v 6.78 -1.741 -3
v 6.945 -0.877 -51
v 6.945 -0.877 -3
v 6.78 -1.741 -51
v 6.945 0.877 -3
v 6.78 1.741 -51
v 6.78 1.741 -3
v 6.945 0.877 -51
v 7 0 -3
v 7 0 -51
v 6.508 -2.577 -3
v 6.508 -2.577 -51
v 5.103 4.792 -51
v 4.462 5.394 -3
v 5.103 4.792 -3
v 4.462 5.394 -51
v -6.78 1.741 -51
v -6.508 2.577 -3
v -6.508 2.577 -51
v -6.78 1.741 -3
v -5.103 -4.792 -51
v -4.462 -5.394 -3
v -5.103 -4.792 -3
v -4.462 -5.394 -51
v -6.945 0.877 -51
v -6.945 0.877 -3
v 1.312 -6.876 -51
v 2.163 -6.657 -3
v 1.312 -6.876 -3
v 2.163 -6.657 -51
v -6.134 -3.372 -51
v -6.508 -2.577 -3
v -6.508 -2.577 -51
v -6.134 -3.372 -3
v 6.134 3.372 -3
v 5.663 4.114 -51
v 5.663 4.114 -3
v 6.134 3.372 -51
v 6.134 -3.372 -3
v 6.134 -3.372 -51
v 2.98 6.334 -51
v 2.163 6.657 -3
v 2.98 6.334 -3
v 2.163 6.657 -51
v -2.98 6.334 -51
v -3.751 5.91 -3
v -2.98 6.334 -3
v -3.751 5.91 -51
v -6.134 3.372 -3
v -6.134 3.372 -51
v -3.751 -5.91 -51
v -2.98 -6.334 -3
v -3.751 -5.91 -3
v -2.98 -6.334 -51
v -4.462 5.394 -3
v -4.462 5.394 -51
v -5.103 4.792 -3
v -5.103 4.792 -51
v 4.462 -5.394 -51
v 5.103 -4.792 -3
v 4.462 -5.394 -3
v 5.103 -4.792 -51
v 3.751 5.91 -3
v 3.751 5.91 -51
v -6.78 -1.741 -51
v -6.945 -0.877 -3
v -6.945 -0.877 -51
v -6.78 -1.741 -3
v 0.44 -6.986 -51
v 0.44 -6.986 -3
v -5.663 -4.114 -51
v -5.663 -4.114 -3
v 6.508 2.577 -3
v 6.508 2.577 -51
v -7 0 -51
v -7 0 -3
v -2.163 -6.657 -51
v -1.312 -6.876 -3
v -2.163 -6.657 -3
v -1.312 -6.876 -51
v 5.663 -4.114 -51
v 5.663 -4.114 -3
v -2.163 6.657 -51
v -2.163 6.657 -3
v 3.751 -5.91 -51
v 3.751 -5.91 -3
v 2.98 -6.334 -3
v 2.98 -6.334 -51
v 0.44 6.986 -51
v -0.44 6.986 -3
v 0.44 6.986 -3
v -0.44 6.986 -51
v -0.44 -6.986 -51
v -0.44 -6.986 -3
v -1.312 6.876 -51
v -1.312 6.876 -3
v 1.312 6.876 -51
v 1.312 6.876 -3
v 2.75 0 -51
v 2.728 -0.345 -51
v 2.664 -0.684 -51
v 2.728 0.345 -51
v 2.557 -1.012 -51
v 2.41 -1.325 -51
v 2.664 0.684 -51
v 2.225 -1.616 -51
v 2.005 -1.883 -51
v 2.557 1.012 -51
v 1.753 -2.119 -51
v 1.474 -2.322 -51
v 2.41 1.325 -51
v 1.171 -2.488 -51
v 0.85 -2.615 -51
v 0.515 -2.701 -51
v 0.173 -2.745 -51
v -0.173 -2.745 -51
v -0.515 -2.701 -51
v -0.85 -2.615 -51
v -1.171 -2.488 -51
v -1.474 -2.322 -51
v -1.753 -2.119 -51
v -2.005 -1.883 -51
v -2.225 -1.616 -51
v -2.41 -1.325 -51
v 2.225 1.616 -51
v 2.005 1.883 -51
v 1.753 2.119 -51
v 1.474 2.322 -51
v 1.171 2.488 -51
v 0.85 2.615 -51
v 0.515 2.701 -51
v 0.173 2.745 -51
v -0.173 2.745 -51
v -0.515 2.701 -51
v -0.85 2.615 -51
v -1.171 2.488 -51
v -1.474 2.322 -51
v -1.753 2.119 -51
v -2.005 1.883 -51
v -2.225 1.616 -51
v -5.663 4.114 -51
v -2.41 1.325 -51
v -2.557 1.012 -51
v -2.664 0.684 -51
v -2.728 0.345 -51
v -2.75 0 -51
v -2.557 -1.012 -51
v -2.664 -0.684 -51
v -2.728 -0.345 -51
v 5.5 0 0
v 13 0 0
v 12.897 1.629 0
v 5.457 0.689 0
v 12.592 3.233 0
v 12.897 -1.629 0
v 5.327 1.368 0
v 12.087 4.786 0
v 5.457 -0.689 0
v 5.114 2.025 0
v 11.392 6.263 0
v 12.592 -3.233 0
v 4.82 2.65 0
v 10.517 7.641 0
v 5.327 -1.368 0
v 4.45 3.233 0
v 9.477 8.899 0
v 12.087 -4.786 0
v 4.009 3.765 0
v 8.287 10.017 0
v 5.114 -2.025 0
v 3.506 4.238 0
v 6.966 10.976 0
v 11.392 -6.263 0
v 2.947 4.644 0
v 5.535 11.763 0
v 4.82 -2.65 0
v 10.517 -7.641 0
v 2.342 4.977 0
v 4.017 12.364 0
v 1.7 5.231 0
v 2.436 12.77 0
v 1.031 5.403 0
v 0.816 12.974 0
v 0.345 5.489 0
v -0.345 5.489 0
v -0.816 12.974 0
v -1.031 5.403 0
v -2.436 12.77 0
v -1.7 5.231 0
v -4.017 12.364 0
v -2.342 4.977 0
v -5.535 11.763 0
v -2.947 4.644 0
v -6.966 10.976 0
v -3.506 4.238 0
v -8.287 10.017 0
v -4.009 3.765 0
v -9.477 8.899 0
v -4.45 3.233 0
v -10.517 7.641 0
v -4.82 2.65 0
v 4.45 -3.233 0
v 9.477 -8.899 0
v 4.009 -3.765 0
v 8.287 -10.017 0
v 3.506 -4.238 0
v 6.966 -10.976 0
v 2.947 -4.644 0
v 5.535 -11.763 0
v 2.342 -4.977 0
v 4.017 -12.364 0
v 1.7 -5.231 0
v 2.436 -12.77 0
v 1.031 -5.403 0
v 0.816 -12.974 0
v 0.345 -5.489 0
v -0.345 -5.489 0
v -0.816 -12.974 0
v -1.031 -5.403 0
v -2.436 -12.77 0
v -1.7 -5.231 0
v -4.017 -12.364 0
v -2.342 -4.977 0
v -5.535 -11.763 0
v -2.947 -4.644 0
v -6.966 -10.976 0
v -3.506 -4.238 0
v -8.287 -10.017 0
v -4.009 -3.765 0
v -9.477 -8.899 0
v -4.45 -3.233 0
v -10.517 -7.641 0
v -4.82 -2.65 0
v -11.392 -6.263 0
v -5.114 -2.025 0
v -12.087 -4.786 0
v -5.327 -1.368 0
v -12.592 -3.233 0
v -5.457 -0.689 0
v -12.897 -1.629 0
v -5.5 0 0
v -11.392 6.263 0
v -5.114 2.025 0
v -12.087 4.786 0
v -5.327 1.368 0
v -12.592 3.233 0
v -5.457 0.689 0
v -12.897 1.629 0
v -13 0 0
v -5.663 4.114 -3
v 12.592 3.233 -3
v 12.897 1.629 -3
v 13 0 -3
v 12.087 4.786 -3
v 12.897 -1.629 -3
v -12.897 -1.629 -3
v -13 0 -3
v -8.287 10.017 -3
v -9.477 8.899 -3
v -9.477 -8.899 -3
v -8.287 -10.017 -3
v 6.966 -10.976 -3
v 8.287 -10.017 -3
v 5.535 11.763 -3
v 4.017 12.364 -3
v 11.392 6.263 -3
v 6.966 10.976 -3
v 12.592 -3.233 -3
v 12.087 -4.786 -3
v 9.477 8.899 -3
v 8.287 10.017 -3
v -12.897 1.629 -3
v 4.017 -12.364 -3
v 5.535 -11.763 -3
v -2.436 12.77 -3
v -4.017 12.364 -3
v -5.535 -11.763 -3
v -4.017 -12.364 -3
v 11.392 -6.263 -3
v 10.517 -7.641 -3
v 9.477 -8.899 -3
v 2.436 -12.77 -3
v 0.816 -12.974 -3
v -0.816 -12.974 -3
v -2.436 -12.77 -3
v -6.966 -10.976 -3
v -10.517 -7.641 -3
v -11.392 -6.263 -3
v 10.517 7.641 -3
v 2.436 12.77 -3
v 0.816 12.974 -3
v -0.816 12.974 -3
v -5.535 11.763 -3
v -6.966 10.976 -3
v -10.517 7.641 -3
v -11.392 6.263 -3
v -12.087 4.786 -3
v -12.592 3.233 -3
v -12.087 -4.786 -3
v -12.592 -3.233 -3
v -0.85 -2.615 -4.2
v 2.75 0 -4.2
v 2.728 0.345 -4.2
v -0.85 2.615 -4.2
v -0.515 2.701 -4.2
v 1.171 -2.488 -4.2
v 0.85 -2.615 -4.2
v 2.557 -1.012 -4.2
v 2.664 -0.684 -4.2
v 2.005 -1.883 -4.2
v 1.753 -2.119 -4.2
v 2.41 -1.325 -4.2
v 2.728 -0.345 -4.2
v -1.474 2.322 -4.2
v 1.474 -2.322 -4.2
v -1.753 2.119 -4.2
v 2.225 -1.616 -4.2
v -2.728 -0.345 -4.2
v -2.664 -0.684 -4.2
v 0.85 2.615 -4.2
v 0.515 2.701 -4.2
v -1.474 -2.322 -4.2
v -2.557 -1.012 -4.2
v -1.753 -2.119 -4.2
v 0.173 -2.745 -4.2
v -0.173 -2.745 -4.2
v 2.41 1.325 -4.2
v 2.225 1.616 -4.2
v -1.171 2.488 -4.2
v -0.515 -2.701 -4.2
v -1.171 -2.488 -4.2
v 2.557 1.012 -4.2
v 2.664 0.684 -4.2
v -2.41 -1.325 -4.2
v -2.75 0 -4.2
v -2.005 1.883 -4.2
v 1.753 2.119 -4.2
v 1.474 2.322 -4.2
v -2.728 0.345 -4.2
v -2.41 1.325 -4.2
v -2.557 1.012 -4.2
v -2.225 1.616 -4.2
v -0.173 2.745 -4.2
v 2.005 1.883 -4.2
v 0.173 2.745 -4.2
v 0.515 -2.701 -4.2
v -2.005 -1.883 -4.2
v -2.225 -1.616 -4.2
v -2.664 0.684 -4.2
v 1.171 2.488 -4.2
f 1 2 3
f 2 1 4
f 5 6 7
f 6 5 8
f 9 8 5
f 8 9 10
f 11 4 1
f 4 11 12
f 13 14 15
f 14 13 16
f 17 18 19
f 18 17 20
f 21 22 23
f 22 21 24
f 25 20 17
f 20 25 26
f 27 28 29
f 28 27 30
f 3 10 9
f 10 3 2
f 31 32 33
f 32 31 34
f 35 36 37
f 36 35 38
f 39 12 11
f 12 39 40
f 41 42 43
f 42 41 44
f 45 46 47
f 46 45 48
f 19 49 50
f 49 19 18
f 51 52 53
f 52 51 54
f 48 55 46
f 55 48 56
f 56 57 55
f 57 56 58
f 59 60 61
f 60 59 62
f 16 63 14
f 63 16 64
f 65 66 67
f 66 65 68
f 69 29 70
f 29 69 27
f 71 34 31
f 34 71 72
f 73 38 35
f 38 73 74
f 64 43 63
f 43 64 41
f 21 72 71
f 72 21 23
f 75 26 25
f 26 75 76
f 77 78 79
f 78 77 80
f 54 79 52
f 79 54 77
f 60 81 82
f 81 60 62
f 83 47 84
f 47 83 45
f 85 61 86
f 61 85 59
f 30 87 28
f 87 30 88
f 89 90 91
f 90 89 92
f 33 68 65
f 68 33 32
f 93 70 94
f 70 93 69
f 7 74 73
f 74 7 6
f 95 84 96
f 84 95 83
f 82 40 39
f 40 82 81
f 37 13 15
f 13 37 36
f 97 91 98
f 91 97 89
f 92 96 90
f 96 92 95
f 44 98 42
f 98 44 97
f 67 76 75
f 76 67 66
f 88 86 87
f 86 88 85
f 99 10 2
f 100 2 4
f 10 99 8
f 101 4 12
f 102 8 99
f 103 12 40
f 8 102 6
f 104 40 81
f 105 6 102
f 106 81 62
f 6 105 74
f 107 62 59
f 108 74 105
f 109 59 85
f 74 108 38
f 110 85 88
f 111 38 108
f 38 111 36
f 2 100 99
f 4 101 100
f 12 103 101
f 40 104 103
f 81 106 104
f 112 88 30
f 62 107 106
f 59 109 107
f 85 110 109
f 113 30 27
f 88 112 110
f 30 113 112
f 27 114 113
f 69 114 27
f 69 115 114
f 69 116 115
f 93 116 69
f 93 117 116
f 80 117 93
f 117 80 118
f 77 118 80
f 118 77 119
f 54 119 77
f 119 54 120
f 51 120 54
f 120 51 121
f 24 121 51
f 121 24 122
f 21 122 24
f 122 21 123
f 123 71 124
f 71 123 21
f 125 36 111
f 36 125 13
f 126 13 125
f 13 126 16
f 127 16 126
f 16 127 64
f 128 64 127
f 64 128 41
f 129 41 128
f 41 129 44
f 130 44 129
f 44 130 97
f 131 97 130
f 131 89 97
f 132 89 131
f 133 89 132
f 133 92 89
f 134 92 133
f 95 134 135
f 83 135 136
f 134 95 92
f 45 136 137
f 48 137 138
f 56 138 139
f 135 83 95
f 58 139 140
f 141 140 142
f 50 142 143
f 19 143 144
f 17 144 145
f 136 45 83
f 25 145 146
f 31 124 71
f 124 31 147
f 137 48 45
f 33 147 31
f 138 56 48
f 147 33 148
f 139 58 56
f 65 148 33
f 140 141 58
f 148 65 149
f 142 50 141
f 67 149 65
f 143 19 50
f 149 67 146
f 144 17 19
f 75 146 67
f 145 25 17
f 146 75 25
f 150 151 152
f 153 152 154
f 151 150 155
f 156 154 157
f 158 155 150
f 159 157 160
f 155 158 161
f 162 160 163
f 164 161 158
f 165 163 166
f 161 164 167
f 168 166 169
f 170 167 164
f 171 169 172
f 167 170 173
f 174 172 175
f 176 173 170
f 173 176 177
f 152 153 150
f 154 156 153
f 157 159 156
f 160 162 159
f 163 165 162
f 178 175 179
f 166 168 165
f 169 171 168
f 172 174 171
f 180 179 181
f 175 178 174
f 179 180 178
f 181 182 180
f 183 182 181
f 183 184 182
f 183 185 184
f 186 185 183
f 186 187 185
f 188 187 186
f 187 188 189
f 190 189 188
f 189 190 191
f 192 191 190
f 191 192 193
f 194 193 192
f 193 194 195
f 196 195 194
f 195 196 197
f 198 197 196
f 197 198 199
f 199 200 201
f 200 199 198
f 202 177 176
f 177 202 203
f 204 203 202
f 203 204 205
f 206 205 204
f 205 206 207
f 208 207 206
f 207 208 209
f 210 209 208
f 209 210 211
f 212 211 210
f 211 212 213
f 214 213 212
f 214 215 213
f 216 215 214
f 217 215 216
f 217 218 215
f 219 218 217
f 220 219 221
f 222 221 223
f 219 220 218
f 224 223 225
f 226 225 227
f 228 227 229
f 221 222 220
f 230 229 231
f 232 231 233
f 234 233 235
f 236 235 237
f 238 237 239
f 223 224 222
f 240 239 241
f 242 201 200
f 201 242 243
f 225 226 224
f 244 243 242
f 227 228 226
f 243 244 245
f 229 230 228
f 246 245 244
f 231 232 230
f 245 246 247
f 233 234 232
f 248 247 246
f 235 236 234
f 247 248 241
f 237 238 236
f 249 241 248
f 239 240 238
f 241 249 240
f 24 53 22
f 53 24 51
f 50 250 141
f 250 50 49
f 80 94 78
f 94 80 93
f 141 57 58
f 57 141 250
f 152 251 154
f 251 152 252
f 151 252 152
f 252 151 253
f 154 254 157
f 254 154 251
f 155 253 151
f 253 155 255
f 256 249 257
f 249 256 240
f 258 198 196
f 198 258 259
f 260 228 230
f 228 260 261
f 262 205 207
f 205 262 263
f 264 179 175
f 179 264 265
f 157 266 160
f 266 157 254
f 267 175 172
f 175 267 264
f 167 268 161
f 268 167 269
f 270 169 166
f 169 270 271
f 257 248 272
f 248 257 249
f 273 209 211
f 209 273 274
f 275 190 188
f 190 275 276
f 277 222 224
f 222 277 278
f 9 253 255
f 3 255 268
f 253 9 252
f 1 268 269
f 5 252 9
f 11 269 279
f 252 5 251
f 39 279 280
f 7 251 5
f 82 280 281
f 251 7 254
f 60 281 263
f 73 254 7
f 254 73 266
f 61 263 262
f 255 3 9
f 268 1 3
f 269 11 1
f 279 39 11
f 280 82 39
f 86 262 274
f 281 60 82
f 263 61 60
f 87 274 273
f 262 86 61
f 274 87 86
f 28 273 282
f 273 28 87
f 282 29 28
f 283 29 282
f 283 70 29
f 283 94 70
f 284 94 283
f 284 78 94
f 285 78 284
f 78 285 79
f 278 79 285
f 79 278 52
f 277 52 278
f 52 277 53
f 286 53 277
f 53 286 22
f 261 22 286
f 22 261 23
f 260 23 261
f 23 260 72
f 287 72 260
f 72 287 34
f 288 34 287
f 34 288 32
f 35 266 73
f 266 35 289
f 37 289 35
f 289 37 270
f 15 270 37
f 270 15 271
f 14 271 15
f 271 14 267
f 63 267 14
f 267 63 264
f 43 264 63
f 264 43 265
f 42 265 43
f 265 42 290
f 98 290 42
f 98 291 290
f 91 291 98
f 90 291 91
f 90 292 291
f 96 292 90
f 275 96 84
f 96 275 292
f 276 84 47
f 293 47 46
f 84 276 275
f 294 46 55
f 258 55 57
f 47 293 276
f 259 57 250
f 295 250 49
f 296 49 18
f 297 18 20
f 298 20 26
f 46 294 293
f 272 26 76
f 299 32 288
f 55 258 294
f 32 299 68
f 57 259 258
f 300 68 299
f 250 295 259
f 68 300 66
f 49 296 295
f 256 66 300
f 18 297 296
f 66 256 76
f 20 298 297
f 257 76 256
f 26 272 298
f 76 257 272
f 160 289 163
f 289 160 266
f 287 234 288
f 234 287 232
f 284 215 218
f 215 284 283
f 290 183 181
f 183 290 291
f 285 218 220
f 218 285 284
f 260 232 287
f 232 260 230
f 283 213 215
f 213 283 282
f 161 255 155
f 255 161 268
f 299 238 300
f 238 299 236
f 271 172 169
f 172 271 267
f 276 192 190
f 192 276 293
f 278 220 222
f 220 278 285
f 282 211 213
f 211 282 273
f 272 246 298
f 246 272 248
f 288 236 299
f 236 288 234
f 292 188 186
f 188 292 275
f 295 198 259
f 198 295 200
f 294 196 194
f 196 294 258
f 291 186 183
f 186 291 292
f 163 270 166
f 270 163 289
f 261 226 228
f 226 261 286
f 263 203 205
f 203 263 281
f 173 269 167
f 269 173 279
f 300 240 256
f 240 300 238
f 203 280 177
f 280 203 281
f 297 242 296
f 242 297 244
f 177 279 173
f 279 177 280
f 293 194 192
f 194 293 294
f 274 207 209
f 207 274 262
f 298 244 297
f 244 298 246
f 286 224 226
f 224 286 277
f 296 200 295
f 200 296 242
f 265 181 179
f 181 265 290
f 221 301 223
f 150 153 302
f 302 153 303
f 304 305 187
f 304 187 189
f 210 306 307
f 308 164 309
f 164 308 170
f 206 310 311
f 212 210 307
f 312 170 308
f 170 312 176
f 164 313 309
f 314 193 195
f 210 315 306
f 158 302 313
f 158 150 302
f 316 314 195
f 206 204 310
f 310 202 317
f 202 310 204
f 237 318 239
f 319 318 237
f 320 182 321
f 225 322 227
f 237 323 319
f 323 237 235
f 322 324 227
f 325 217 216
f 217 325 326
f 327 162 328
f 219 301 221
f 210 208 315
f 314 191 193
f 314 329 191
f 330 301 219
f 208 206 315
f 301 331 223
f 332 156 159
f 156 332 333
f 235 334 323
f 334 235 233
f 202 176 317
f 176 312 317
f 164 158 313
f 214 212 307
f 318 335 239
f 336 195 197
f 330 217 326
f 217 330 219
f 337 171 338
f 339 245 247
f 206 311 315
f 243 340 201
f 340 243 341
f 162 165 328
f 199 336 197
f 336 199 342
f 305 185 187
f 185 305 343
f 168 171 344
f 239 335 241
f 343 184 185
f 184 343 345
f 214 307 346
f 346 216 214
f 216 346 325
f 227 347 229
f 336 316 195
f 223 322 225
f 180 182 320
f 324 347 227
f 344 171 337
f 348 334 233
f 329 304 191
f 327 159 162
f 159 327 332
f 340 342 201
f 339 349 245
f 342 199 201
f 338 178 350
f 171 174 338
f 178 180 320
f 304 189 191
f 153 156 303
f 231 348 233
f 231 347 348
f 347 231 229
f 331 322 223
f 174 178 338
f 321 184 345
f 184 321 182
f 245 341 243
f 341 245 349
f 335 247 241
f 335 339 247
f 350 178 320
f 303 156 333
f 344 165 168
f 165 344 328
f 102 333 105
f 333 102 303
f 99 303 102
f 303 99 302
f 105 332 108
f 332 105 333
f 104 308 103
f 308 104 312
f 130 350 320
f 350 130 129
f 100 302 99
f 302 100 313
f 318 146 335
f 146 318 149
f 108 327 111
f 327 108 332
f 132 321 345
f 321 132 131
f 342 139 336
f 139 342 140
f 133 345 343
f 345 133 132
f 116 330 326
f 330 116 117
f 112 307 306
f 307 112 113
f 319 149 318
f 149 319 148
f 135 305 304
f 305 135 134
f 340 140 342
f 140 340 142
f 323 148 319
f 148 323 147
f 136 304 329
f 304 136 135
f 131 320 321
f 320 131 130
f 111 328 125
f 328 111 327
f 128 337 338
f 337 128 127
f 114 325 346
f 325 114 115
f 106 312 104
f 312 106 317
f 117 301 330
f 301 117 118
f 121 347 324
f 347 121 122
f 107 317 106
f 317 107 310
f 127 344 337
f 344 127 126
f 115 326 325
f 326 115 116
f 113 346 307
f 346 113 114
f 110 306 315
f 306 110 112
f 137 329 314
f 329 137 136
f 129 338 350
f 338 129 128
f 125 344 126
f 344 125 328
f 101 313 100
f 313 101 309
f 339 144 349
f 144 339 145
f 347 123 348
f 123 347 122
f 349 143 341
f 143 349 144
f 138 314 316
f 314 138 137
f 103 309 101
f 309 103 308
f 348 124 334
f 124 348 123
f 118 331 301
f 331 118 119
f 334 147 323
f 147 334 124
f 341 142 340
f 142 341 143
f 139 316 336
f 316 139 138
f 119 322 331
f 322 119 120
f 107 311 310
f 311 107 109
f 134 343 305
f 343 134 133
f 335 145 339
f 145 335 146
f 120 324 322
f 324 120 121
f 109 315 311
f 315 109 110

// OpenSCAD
$fn = 50;


difference() {
	union() {
		translate(v = [0, 0, -51.0000000000]) {
			cylinder(h = 51, r = 7.0000000000);
		}
		translate(v = [0, 0, -3.0000000000]) {
			cylinder(h = 3, r = 13.0000000000);
		}
	}
	union() {
		translate(v = [0, 0, 0]) {
			rotate(a = [0, 0, 0]) {
				difference() {
					union() {
						#translate(v = [0, 0, -51.0000000000]) {
							cylinder(h = 51, r = 2.2500000000);
						}
						#translate(v = [0, 0, -4.2000000000]) {
							cylinder(h = 4.2000000000, r1 = 2.7500000000, r2 = 5.5000000000);
						}
						#translate(v = [0, 0, -51.0000000000]) {
							cylinder(h = 51, r = 2.7500000000);
						}
						#translate(v = [0, 0, -51.0000000000]) {
							cylinder(h = 51, r = 2.2500000000);
						}
					}
					union();
				}
			}
		}
	}
}
